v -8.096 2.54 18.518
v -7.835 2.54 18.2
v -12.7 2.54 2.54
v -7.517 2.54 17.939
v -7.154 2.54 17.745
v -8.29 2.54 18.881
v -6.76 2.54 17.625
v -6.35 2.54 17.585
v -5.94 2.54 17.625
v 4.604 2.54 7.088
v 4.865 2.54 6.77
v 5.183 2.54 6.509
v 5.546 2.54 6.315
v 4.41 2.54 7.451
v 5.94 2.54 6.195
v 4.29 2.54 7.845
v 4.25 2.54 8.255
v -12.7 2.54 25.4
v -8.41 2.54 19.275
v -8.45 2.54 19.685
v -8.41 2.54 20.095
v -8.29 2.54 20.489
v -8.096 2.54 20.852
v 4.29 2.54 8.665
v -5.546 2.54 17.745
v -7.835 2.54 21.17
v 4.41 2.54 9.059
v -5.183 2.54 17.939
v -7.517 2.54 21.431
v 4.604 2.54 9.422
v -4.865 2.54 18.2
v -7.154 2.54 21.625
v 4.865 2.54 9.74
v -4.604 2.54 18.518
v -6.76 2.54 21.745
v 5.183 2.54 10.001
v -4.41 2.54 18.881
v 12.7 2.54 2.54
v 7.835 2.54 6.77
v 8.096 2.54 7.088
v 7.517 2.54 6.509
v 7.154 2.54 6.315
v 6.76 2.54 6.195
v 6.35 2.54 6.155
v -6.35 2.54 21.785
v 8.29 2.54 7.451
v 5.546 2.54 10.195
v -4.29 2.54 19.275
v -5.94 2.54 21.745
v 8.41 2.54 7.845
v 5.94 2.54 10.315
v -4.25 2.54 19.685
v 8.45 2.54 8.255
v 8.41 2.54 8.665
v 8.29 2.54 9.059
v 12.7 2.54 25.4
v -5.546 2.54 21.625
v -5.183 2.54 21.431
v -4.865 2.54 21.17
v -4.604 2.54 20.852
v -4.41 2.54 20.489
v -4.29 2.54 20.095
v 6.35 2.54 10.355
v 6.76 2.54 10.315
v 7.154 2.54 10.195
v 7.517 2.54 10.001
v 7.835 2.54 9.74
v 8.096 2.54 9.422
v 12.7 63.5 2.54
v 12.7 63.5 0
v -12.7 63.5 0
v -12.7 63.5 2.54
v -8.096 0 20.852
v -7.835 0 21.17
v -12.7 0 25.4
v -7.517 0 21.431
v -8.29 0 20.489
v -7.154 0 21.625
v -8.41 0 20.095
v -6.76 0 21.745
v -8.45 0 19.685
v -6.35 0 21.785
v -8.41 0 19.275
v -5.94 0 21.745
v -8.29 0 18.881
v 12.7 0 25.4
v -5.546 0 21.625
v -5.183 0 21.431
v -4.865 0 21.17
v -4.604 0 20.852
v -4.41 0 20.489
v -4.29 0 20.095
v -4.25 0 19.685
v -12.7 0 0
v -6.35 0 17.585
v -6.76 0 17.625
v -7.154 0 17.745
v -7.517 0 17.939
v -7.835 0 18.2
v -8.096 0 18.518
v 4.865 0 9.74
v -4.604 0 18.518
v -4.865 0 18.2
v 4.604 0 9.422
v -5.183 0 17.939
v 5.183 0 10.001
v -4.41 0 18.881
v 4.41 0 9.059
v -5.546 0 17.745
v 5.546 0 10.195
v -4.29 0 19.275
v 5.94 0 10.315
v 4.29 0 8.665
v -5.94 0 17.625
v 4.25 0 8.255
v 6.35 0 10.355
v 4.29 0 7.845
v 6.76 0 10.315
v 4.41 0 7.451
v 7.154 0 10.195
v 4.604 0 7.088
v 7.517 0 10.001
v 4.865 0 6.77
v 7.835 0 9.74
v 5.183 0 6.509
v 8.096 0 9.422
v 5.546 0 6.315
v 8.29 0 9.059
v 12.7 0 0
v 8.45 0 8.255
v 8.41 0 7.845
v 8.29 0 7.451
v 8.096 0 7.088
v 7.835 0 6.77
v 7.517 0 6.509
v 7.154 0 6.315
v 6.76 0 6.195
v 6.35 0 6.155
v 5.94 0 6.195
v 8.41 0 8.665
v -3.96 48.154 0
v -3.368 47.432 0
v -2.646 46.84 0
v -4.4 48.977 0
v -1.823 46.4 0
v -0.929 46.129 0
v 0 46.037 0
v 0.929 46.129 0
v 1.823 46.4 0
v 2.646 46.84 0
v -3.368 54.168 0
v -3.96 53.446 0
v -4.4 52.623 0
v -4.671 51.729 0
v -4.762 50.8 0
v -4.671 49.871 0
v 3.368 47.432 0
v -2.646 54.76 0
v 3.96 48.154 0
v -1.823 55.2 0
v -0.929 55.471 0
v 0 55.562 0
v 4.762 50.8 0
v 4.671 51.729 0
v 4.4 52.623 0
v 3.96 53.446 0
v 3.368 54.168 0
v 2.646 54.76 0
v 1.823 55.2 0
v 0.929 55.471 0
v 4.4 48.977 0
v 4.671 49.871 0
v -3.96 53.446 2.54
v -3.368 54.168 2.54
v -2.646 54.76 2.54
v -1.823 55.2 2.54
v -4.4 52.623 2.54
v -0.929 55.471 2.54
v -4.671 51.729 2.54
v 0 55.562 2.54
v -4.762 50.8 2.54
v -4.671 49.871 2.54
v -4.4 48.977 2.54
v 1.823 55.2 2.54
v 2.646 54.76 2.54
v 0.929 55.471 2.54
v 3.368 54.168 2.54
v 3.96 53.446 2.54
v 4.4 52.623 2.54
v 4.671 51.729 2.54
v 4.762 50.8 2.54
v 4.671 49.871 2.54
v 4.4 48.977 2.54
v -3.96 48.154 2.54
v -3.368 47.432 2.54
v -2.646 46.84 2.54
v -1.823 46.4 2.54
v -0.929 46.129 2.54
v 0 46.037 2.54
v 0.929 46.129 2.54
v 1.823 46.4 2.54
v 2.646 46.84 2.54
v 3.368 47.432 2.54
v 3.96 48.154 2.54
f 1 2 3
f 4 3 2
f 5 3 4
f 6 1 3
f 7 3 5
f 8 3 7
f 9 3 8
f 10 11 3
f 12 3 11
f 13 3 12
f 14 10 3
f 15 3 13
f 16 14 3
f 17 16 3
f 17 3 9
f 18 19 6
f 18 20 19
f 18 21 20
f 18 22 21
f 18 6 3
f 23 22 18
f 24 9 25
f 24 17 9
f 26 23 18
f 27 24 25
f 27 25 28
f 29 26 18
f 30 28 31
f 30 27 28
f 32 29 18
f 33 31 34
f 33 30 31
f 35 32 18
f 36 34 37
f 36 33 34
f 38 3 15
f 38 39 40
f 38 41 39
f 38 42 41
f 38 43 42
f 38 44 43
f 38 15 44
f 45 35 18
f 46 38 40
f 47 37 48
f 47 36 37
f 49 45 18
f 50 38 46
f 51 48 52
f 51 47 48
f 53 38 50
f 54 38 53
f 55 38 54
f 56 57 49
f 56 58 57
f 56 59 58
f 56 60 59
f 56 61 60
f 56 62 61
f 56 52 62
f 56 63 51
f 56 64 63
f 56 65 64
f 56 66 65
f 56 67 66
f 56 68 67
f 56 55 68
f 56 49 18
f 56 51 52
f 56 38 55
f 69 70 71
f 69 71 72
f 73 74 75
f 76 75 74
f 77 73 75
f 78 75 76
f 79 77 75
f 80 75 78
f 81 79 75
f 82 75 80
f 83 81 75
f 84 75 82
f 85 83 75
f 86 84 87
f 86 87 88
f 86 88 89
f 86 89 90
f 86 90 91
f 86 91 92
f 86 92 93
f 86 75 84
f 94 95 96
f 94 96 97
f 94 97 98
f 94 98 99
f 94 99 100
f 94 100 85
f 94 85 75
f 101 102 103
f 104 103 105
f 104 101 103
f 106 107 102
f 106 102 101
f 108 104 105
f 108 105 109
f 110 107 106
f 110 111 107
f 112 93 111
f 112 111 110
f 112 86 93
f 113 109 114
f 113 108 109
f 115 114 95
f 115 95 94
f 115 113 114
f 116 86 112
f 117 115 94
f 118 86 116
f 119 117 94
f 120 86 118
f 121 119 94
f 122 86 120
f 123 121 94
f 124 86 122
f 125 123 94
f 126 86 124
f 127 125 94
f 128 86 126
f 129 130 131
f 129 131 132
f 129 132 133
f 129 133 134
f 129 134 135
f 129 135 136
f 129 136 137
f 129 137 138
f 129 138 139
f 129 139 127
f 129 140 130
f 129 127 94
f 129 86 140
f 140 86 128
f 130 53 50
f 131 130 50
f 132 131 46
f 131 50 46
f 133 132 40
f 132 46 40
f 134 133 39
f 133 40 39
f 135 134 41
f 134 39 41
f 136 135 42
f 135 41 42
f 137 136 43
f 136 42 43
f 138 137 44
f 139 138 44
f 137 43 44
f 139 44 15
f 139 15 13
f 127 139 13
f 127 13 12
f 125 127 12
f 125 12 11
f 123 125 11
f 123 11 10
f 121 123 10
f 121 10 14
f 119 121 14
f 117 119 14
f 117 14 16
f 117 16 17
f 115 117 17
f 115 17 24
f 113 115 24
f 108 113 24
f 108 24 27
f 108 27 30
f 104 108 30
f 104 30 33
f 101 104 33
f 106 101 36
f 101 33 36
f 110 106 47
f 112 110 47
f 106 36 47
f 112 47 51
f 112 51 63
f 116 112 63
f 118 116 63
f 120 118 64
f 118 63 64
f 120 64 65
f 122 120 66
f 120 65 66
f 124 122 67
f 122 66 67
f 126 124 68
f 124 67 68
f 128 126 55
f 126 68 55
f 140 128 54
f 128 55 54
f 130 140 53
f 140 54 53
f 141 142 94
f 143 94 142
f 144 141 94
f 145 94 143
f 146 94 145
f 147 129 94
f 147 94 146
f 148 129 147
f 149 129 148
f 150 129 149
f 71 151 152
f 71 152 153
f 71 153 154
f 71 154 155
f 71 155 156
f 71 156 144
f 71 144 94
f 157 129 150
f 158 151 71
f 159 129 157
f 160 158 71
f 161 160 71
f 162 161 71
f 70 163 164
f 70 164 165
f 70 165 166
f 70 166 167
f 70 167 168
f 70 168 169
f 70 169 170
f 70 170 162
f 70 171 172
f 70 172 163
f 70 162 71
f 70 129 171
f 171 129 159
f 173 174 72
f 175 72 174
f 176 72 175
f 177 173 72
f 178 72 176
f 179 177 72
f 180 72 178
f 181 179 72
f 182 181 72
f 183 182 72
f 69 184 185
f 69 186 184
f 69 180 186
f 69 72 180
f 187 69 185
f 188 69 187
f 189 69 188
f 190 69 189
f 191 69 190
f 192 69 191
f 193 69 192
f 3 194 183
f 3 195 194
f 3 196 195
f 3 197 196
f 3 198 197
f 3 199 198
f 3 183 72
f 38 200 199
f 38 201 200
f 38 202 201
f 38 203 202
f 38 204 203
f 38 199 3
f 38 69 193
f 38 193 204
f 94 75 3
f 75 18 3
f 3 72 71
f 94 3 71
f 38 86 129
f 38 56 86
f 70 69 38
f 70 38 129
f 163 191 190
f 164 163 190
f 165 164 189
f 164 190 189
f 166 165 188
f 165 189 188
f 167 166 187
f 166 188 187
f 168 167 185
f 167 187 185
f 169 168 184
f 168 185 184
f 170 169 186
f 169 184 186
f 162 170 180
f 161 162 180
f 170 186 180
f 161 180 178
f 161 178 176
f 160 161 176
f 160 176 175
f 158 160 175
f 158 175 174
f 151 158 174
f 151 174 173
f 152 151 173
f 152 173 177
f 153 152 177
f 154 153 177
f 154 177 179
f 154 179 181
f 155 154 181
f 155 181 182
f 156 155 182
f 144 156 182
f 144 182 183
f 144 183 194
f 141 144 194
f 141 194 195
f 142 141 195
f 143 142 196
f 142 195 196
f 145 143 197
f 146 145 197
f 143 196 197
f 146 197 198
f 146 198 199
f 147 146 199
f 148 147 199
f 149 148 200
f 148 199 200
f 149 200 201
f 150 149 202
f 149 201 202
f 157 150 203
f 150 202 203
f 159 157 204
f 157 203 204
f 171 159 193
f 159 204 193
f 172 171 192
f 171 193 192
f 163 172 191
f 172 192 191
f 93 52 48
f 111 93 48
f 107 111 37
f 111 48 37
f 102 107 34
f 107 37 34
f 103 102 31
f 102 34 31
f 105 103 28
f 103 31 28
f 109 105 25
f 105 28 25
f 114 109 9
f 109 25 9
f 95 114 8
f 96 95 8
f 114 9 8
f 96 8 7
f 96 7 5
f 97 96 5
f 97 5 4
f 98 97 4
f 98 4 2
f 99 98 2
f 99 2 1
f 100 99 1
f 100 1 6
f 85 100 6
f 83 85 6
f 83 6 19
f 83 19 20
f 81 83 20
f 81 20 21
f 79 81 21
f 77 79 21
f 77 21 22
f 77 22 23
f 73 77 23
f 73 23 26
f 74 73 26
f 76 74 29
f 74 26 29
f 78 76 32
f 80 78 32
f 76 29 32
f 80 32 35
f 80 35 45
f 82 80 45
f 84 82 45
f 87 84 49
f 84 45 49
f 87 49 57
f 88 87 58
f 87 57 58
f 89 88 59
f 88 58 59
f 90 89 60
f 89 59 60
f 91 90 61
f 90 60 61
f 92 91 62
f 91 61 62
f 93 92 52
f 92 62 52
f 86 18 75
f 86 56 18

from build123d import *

# Parameters (mm, degrees)
BOSS_EXTRUDE1_DEPTH      = 12.7
BOSS_EXTRUDE1_DEPTH_BACK = 12.7
SKETCH2_R                = 4.7625
CUT_EXTRUDE1_DEPTH       = 12.7
SKETCH4_R                = 2.1
CUT_EXTRUDE2_DEPTH       = 68.250067658


with BuildPart() as part:
    # Sketch1 → Boss-Extrude1 (new, two sides: drawn at the far end of the back side and taken through both)
    with BuildSketch(Plane(origin=(0, 0, 0), x_dir=(0, 0, -1), z_dir=(1, 0, 0)).offset(-BOSS_EXTRUDE1_DEPTH_BACK)):
        Polygon((-25.4, 0), (0, 0), (0, 63.5), (-2.54, 63.5), (-2.54, 2.54), (-25.4, 2.54), align=None)
    extrude(amount=BOSS_EXTRUDE1_DEPTH + BOSS_EXTRUDE1_DEPTH_BACK)

    # Sketch2 → Cut-Extrude1 (cut)
    with BuildSketch(Plane.XY.offset(2.54)):
        with Locations((0, 50.8)):
            Circle(SKETCH2_R)
    extrude(amount=-CUT_EXTRUDE1_DEPTH, mode=Mode.SUBTRACT)

    # Sketch4 → Cut-Extrude2 (cut, through all)
    with BuildSketch(Plane(origin=(0, 2.54, 0), x_dir=(1, 0, 0), z_dir=(0, 1, 0))):
        with Locations((6.35, -8.255)):
            Circle(SKETCH4_R)
        with Locations((-6.35, -19.685)):
            Circle(SKETCH4_R)
    extrude(amount=-CUT_EXTRUDE2_DEPTH, mode=Mode.SUBTRACT)


solid = part.part
